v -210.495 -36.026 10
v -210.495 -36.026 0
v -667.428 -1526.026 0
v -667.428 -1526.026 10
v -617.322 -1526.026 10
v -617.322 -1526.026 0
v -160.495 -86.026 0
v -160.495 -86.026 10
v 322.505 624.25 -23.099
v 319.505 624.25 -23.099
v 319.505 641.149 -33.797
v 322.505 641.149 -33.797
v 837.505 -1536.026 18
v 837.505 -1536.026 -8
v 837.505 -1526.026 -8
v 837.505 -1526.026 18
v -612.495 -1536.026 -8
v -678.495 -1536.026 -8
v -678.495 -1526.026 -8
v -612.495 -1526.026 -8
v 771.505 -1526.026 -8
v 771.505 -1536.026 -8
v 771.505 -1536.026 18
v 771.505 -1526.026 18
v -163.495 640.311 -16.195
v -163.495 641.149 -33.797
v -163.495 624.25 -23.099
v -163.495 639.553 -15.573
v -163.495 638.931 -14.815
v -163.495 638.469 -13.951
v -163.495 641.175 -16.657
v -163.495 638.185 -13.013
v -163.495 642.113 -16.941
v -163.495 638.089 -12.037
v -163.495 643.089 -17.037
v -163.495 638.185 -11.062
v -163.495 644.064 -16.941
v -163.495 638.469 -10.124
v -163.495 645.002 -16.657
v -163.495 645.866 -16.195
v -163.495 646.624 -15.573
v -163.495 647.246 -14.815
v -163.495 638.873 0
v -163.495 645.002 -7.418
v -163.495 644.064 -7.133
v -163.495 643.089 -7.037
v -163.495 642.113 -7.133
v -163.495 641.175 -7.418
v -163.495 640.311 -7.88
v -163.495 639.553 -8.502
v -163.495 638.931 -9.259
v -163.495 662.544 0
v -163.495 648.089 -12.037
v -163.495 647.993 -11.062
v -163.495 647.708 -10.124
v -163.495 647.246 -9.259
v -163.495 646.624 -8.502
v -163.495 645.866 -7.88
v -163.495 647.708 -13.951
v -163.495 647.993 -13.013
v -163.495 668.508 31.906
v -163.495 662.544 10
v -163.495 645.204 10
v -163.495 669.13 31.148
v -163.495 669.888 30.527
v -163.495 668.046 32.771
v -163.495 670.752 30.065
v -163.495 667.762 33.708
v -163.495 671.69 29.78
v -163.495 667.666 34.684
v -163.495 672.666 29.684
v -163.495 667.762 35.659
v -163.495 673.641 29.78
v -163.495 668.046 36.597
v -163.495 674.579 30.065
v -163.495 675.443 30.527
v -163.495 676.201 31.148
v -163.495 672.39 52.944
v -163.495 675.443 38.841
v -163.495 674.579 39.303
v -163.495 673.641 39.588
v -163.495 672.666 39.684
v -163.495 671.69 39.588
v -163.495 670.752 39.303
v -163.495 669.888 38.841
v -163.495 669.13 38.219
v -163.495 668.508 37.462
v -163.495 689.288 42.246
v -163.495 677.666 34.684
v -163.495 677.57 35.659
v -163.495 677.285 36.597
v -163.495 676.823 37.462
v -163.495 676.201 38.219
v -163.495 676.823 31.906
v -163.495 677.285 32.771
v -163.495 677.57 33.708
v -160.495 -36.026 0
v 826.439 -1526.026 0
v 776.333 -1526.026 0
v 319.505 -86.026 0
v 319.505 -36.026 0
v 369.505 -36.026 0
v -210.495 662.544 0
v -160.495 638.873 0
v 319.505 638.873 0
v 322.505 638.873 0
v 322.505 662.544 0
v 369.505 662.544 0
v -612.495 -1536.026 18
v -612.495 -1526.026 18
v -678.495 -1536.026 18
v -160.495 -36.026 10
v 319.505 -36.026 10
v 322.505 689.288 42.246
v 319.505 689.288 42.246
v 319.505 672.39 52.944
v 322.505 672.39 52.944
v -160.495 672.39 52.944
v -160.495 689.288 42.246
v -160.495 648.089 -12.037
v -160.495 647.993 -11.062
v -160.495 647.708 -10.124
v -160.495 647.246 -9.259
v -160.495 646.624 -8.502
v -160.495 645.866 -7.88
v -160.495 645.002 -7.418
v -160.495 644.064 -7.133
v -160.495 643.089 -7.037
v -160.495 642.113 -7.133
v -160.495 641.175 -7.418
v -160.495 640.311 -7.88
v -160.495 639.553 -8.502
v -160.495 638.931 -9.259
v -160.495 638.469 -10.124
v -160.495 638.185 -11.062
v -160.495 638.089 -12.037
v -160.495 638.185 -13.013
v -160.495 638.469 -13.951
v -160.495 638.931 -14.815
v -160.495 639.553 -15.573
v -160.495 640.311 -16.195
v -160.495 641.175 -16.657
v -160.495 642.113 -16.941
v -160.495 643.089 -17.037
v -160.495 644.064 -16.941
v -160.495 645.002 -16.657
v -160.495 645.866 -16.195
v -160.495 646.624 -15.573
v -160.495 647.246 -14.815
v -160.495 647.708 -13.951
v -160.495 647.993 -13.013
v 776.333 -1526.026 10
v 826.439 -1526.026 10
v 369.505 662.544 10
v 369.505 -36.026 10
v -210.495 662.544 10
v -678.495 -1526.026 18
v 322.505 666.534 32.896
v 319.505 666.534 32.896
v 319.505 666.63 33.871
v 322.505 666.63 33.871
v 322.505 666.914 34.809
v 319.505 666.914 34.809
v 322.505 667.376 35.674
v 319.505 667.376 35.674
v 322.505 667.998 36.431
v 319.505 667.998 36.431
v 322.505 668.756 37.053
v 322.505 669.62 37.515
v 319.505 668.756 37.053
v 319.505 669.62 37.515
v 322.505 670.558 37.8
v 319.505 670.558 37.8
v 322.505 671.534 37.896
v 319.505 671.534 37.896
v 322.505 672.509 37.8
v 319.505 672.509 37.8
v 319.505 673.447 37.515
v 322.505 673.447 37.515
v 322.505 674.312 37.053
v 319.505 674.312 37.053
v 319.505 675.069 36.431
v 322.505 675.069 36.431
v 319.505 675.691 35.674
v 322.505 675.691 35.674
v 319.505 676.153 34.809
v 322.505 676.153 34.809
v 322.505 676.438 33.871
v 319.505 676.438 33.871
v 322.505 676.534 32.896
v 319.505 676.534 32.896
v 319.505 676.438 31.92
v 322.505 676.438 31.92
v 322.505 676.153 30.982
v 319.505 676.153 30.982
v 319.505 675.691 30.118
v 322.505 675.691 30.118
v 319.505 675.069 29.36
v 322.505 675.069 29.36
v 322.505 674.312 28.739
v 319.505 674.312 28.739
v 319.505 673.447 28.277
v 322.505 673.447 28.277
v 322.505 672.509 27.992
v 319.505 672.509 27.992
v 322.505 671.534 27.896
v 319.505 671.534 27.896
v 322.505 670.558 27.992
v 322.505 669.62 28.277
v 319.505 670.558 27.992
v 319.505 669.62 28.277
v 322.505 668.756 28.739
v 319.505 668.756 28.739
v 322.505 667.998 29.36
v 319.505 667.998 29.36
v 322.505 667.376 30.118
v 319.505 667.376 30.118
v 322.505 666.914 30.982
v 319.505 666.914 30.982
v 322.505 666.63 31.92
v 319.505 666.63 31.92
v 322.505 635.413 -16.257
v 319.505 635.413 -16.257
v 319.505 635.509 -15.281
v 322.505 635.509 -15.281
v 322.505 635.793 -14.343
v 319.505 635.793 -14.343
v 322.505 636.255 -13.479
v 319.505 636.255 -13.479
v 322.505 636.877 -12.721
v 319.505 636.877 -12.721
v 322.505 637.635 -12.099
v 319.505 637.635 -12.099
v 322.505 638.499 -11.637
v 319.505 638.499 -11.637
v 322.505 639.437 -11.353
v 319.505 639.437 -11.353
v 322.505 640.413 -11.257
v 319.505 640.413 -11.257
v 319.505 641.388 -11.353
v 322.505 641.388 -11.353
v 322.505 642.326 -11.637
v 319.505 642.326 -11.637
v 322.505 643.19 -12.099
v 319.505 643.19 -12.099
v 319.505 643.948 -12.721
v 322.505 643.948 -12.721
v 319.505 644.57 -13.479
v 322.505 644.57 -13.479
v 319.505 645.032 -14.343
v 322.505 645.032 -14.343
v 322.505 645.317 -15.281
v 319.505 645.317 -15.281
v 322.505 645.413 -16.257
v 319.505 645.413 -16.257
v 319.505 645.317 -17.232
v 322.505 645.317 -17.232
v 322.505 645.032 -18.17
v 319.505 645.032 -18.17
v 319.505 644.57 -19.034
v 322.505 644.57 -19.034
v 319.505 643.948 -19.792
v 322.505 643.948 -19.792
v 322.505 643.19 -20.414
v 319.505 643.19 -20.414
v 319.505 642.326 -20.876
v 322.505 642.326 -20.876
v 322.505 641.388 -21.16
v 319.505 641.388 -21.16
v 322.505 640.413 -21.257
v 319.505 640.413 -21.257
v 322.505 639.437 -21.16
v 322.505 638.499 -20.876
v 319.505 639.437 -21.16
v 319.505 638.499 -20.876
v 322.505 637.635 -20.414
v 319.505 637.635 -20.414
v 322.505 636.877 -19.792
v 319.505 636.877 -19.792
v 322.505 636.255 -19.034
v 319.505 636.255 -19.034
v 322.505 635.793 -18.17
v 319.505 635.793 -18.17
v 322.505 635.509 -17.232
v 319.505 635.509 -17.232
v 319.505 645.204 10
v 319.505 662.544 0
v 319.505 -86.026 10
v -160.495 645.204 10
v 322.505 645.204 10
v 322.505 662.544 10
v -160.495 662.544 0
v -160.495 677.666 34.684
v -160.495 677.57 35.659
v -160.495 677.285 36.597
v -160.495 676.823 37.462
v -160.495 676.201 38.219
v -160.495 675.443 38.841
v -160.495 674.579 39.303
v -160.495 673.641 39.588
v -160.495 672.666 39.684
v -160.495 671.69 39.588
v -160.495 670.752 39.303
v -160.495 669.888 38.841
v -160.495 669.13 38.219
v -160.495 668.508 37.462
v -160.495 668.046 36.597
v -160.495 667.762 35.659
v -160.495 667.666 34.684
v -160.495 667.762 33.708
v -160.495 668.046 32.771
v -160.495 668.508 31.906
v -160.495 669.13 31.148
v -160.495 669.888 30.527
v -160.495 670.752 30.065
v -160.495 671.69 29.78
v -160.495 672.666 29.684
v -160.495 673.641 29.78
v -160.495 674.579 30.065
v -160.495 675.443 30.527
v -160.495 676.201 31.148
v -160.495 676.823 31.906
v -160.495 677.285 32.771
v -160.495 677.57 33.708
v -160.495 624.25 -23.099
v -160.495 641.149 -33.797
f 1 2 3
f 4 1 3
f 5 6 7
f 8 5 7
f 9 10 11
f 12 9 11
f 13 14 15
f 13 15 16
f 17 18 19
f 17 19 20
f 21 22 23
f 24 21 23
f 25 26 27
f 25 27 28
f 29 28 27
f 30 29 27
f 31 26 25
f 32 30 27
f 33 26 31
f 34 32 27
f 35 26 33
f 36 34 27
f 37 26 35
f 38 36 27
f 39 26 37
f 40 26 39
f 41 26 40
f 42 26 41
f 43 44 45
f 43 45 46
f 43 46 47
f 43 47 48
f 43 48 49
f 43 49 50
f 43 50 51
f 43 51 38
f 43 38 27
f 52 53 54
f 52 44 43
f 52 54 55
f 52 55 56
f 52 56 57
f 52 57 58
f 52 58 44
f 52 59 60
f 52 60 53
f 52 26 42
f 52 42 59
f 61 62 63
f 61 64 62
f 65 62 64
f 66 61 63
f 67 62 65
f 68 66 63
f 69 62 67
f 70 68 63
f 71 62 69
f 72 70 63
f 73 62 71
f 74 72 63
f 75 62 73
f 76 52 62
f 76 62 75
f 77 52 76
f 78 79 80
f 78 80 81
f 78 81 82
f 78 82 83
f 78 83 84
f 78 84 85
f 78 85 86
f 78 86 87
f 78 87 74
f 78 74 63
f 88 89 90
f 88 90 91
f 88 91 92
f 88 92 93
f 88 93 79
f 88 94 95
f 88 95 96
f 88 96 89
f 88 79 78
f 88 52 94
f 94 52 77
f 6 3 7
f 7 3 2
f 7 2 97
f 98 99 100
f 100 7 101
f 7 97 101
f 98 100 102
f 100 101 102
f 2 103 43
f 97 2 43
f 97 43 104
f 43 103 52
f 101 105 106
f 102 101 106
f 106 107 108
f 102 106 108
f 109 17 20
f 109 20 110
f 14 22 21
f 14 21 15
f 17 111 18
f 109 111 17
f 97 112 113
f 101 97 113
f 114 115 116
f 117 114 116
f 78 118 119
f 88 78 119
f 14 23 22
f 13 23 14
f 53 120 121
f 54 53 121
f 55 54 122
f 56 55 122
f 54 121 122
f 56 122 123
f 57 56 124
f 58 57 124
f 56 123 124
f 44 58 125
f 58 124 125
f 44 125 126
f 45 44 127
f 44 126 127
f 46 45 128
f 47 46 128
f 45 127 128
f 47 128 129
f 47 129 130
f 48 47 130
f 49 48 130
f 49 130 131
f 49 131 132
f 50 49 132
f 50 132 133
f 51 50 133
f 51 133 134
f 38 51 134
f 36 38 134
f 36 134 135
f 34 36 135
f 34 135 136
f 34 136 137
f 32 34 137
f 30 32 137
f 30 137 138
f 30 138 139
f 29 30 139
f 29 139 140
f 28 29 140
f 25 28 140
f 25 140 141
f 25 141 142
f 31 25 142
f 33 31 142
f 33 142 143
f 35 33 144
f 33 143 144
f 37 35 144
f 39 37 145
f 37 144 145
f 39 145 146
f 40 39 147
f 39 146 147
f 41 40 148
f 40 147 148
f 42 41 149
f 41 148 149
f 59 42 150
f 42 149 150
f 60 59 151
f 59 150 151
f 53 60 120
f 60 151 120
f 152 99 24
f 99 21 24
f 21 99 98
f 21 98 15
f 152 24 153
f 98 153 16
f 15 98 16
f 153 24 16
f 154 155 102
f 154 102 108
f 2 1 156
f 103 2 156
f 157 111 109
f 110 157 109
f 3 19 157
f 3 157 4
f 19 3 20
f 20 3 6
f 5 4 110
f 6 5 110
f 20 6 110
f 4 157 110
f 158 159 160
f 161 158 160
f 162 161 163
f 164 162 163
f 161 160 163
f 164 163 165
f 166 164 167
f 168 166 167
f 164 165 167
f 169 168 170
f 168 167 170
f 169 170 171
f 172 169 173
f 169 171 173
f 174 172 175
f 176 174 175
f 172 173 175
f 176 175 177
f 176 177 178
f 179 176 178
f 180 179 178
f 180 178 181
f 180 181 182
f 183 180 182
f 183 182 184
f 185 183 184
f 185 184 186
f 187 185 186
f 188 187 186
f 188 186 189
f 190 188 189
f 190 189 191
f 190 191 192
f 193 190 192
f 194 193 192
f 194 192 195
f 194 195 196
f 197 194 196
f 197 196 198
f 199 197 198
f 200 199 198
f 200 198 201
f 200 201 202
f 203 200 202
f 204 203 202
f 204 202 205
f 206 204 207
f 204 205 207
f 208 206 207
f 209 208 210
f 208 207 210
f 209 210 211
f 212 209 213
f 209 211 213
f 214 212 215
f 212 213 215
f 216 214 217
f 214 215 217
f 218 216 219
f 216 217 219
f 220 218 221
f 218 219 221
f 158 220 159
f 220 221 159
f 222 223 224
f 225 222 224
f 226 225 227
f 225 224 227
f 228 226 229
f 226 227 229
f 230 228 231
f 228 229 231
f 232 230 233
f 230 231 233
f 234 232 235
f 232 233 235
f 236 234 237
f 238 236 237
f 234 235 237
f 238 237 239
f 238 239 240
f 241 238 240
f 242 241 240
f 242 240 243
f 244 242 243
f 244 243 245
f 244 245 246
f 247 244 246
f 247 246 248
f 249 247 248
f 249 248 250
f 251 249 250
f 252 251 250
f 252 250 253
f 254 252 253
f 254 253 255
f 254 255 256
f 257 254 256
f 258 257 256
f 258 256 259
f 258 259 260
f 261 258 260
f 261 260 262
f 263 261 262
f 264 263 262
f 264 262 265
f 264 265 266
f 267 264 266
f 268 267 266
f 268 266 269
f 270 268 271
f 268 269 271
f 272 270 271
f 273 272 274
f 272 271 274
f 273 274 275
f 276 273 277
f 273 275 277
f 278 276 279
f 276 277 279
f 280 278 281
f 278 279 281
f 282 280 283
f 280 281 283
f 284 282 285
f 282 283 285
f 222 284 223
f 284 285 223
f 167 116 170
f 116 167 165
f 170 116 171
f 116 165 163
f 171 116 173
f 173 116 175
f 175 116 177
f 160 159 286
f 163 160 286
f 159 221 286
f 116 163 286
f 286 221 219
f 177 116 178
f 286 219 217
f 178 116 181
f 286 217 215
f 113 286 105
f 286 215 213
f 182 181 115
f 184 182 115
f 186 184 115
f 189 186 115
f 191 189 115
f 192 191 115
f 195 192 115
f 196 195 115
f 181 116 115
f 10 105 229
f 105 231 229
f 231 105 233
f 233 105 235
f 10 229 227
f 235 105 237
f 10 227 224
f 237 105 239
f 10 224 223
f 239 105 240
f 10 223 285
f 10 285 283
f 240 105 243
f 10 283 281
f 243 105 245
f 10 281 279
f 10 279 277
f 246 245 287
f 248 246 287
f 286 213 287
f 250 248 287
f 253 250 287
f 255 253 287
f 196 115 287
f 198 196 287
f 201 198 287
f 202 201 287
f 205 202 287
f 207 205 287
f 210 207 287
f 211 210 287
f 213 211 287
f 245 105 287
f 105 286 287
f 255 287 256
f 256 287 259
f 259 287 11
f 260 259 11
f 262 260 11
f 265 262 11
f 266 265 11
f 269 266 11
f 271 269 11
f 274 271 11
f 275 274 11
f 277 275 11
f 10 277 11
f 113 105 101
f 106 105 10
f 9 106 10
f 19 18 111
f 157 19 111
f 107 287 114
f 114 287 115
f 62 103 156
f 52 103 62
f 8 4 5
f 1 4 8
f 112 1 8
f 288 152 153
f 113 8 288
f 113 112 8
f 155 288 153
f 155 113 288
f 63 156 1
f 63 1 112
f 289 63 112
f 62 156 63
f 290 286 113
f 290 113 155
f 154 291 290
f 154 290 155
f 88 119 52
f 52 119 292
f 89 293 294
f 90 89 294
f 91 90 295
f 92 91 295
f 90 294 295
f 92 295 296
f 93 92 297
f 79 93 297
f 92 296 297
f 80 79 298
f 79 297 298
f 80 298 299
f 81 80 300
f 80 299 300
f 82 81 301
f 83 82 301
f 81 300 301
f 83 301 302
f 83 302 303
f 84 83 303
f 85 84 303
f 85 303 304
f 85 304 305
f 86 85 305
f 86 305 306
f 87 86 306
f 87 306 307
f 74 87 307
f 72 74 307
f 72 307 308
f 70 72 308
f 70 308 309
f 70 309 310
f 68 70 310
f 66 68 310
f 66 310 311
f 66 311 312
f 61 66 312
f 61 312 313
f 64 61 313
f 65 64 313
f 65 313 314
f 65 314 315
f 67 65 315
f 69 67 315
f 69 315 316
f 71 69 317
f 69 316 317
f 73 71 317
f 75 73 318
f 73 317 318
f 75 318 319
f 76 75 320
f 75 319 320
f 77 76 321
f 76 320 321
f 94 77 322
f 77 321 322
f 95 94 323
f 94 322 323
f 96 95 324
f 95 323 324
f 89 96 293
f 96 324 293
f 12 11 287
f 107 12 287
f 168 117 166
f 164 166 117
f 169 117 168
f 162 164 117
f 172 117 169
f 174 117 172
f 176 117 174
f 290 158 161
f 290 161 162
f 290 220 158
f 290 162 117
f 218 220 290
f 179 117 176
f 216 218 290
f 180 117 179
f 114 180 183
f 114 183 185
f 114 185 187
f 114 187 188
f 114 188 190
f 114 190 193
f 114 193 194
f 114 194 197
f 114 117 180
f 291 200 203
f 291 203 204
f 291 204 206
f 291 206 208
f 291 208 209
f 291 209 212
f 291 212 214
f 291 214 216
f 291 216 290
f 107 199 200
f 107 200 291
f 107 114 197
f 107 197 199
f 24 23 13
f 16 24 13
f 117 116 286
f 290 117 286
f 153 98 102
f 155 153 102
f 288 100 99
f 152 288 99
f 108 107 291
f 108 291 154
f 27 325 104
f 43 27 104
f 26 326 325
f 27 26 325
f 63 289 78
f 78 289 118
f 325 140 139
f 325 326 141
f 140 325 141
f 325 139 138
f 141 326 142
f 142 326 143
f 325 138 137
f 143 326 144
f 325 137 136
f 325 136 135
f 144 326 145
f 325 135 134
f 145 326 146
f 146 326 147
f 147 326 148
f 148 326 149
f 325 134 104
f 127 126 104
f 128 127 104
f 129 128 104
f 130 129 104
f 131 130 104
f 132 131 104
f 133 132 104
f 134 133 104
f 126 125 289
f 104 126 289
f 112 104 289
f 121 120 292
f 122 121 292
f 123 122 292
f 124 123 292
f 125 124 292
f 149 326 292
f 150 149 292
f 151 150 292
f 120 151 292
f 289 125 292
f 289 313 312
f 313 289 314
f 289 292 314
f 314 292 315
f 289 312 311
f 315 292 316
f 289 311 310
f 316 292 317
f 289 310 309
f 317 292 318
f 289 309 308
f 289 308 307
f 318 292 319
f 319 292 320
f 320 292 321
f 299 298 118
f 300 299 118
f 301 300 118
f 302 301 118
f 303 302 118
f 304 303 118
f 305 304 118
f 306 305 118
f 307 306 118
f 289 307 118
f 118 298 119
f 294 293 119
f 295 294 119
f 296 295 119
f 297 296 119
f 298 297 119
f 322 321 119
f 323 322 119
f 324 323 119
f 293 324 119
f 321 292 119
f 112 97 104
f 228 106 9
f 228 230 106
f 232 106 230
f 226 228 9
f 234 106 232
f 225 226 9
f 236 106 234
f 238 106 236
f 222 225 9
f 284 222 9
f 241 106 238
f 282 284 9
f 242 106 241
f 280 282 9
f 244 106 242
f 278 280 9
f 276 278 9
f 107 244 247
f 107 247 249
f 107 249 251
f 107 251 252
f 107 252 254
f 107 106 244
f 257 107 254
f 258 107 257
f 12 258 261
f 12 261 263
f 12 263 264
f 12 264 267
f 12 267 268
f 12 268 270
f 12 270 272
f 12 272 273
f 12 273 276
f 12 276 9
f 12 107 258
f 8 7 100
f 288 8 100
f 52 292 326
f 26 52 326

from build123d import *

# Parameters (mm, degrees)
SKETCH2_W           = 1500
SKETCH2_H           = 2198.57
BOSS_EXTRUDE1_DEPTH = 10
SKETCH3_W           = 480
SKETCH3_H           = 698.5704
SKETCH3_W_2         = 460
CUT_EXTRUDE1_DEPTH  = 1746.724604551
CUT_EXTRUDE3_DEPTH  = 10
CUT_EXTRUDE4_DEPTH  = 1746.724604551
BOSS_EXTRUDE2_DEPTH = 3
BOSS_EXTRUDE3_DEPTH = 3
SKETCH13_R          = 5
CUT_EXTRUDE5_DEPTH  = 1829.189928544
SKETCH14_R          = 5
CUT_EXTRUDE6_DEPTH  = 1829.189928544
SKETCH15_W          = 66
SKETCH15_H          = 26
BOSS_EXTRUDE5_DEPTH = 10
SKETCH16_W          = 66
SKETCH16_H          = 26
BOSS_EXTRUDE9_DEPTH = 10


with BuildPart() as part:
    # Sketch2 → Boss-Extrude1 (new body)
    with BuildSketch(Plane.XY):
        with Locations((79.505300353, -436.740830389)):
            Rectangle(SKETCH2_W, SKETCH2_H)
    extrude(amount=BOSS_EXTRUDE1_DEPTH)

    # Sketch3 → Cut-Extrude1 (cut, through all)
    with BuildSketch(Plane.XY.offset(10)):
        with Locations((79.505300353, 313.258969611)):
            Rectangle(SKETCH3_W, SKETCH3_H)
        with Locations((-440.494699647, 313.258969611)):
            Rectangle(SKETCH3_W_2, SKETCH3_H)
        with Locations((599.505300353, 313.258969611)):
            Rectangle(SKETCH3_W_2, SKETCH3_H)
    extrude(amount=-CUT_EXTRUDE1_DEPTH, mode=Mode.SUBTRACT)

    # Sketch9 → Cut-Extrude3 (cut)
    with BuildSketch(Plane(origin=(0, 0, 0), x_dir=(-1, 0, 0), z_dir=(0, 0, -1))):
        Polygon((-369.505300353, -36.026230389), (-829.505300353, -36.026230389), (-829.505300353, -1536.025830389), align=None)
        Polygon((210.494699647, -36.026230389), (670.494699647, -1536.025830389), (670.494699647, -36.026230389), align=None)
    extrude(amount=-CUT_EXTRUDE3_DEPTH, mode=Mode.SUBTRACT)

    # Sketch10 → Cut-Extrude4 (cut, through all)
    with BuildSketch(Plane(origin=(0, 0, 0), x_dir=(-1, 0, 0), z_dir=(0, 0, -1))):
        Polygon((-319.505300353, -86.026230389), (-779.505300353, -1536.025830389), (620.494699647, -1536.025830389), (160.494699647, -86.026230389), align=None)
    extrude(amount=-CUT_EXTRUDE4_DEPTH, mode=Mode.SUBTRACT)

    # Sketch11 → Boss-Extrude2 (add)
    with BuildSketch(Plane.ZY.offset(-319.505300353)):
        Polygon((0, 662.544169611), (42.246296146, 689.288336489), (52.943962897, 672.389818031), (-23.099370165, 624.250317651), (-33.797036917, 641.148836109), align=None)
    extrude(amount=-BOSS_EXTRUDE2_DEPTH)

    # Sketch12 → Boss-Extrude3 (add)
    with BuildSketch(Plane(origin=(-160.494699647, 0, 0), x_dir=(0, 0, -1), z_dir=(1, 0, 0))):
        Polygon((0, 662.544169611), (33.797036917, 641.148836109), (23.099370165, 624.250317651), (-52.943962897, 672.389818031), (-42.246296146, 689.288336489), align=None)
    extrude(amount=-BOSS_EXTRUDE3_DEPTH)

    # Sketch13 → Cut-Extrude5 (cut, through all)
    with BuildSketch(Plane(origin=(-160.494699647, 0, 0), x_dir=(0, 0, -1), z_dir=(1, 0, 0))):
        with Locations(Location((-34.683917705, 672.665589051, 0), (0, 0, 90))):
            Circle(SKETCH13_R)
        with Locations(Location((12.037265881, 643.088578886, 0), (0, 0, 90))):
            Circle(SKETCH13_R)
    extrude(amount=-CUT_EXTRUDE5_DEPTH, mode=Mode.SUBTRACT)

    # Sketch14 → Cut-Extrude6 (cut, through all)
    with BuildSketch(Plane.ZY.offset(-319.505300353)):
        with Locations(Location((32.895909771, 671.533684318, 0), (0, 0, 270))):
            Circle(SKETCH14_R)
        with Locations(Location((-16.256513993, 640.412580131, 0), (0, 0, 270))):
            Circle(SKETCH14_R)
    extrude(amount=-CUT_EXTRUDE6_DEPTH, mode=Mode.SUBTRACT)

    # Sketch15 → Boss-Extrude5 (add)
    with BuildSketch(Plane.XZ.offset(1536.025830389)):
        with Locations((804.505300353, 5)):
            Rectangle(SKETCH15_W, SKETCH15_H)
    extrude(amount=-BOSS_EXTRUDE5_DEPTH)

    # Sketch16 → Boss-Extrude9 (add)
    with BuildSketch(Plane.XZ.offset(1536.025830389)):
        with Locations((-645.494699647, 5)):
            Rectangle(SKETCH16_W, SKETCH16_H)
    extrude(amount=-BOSS_EXTRUDE9_DEPTH)


solid = part.part
